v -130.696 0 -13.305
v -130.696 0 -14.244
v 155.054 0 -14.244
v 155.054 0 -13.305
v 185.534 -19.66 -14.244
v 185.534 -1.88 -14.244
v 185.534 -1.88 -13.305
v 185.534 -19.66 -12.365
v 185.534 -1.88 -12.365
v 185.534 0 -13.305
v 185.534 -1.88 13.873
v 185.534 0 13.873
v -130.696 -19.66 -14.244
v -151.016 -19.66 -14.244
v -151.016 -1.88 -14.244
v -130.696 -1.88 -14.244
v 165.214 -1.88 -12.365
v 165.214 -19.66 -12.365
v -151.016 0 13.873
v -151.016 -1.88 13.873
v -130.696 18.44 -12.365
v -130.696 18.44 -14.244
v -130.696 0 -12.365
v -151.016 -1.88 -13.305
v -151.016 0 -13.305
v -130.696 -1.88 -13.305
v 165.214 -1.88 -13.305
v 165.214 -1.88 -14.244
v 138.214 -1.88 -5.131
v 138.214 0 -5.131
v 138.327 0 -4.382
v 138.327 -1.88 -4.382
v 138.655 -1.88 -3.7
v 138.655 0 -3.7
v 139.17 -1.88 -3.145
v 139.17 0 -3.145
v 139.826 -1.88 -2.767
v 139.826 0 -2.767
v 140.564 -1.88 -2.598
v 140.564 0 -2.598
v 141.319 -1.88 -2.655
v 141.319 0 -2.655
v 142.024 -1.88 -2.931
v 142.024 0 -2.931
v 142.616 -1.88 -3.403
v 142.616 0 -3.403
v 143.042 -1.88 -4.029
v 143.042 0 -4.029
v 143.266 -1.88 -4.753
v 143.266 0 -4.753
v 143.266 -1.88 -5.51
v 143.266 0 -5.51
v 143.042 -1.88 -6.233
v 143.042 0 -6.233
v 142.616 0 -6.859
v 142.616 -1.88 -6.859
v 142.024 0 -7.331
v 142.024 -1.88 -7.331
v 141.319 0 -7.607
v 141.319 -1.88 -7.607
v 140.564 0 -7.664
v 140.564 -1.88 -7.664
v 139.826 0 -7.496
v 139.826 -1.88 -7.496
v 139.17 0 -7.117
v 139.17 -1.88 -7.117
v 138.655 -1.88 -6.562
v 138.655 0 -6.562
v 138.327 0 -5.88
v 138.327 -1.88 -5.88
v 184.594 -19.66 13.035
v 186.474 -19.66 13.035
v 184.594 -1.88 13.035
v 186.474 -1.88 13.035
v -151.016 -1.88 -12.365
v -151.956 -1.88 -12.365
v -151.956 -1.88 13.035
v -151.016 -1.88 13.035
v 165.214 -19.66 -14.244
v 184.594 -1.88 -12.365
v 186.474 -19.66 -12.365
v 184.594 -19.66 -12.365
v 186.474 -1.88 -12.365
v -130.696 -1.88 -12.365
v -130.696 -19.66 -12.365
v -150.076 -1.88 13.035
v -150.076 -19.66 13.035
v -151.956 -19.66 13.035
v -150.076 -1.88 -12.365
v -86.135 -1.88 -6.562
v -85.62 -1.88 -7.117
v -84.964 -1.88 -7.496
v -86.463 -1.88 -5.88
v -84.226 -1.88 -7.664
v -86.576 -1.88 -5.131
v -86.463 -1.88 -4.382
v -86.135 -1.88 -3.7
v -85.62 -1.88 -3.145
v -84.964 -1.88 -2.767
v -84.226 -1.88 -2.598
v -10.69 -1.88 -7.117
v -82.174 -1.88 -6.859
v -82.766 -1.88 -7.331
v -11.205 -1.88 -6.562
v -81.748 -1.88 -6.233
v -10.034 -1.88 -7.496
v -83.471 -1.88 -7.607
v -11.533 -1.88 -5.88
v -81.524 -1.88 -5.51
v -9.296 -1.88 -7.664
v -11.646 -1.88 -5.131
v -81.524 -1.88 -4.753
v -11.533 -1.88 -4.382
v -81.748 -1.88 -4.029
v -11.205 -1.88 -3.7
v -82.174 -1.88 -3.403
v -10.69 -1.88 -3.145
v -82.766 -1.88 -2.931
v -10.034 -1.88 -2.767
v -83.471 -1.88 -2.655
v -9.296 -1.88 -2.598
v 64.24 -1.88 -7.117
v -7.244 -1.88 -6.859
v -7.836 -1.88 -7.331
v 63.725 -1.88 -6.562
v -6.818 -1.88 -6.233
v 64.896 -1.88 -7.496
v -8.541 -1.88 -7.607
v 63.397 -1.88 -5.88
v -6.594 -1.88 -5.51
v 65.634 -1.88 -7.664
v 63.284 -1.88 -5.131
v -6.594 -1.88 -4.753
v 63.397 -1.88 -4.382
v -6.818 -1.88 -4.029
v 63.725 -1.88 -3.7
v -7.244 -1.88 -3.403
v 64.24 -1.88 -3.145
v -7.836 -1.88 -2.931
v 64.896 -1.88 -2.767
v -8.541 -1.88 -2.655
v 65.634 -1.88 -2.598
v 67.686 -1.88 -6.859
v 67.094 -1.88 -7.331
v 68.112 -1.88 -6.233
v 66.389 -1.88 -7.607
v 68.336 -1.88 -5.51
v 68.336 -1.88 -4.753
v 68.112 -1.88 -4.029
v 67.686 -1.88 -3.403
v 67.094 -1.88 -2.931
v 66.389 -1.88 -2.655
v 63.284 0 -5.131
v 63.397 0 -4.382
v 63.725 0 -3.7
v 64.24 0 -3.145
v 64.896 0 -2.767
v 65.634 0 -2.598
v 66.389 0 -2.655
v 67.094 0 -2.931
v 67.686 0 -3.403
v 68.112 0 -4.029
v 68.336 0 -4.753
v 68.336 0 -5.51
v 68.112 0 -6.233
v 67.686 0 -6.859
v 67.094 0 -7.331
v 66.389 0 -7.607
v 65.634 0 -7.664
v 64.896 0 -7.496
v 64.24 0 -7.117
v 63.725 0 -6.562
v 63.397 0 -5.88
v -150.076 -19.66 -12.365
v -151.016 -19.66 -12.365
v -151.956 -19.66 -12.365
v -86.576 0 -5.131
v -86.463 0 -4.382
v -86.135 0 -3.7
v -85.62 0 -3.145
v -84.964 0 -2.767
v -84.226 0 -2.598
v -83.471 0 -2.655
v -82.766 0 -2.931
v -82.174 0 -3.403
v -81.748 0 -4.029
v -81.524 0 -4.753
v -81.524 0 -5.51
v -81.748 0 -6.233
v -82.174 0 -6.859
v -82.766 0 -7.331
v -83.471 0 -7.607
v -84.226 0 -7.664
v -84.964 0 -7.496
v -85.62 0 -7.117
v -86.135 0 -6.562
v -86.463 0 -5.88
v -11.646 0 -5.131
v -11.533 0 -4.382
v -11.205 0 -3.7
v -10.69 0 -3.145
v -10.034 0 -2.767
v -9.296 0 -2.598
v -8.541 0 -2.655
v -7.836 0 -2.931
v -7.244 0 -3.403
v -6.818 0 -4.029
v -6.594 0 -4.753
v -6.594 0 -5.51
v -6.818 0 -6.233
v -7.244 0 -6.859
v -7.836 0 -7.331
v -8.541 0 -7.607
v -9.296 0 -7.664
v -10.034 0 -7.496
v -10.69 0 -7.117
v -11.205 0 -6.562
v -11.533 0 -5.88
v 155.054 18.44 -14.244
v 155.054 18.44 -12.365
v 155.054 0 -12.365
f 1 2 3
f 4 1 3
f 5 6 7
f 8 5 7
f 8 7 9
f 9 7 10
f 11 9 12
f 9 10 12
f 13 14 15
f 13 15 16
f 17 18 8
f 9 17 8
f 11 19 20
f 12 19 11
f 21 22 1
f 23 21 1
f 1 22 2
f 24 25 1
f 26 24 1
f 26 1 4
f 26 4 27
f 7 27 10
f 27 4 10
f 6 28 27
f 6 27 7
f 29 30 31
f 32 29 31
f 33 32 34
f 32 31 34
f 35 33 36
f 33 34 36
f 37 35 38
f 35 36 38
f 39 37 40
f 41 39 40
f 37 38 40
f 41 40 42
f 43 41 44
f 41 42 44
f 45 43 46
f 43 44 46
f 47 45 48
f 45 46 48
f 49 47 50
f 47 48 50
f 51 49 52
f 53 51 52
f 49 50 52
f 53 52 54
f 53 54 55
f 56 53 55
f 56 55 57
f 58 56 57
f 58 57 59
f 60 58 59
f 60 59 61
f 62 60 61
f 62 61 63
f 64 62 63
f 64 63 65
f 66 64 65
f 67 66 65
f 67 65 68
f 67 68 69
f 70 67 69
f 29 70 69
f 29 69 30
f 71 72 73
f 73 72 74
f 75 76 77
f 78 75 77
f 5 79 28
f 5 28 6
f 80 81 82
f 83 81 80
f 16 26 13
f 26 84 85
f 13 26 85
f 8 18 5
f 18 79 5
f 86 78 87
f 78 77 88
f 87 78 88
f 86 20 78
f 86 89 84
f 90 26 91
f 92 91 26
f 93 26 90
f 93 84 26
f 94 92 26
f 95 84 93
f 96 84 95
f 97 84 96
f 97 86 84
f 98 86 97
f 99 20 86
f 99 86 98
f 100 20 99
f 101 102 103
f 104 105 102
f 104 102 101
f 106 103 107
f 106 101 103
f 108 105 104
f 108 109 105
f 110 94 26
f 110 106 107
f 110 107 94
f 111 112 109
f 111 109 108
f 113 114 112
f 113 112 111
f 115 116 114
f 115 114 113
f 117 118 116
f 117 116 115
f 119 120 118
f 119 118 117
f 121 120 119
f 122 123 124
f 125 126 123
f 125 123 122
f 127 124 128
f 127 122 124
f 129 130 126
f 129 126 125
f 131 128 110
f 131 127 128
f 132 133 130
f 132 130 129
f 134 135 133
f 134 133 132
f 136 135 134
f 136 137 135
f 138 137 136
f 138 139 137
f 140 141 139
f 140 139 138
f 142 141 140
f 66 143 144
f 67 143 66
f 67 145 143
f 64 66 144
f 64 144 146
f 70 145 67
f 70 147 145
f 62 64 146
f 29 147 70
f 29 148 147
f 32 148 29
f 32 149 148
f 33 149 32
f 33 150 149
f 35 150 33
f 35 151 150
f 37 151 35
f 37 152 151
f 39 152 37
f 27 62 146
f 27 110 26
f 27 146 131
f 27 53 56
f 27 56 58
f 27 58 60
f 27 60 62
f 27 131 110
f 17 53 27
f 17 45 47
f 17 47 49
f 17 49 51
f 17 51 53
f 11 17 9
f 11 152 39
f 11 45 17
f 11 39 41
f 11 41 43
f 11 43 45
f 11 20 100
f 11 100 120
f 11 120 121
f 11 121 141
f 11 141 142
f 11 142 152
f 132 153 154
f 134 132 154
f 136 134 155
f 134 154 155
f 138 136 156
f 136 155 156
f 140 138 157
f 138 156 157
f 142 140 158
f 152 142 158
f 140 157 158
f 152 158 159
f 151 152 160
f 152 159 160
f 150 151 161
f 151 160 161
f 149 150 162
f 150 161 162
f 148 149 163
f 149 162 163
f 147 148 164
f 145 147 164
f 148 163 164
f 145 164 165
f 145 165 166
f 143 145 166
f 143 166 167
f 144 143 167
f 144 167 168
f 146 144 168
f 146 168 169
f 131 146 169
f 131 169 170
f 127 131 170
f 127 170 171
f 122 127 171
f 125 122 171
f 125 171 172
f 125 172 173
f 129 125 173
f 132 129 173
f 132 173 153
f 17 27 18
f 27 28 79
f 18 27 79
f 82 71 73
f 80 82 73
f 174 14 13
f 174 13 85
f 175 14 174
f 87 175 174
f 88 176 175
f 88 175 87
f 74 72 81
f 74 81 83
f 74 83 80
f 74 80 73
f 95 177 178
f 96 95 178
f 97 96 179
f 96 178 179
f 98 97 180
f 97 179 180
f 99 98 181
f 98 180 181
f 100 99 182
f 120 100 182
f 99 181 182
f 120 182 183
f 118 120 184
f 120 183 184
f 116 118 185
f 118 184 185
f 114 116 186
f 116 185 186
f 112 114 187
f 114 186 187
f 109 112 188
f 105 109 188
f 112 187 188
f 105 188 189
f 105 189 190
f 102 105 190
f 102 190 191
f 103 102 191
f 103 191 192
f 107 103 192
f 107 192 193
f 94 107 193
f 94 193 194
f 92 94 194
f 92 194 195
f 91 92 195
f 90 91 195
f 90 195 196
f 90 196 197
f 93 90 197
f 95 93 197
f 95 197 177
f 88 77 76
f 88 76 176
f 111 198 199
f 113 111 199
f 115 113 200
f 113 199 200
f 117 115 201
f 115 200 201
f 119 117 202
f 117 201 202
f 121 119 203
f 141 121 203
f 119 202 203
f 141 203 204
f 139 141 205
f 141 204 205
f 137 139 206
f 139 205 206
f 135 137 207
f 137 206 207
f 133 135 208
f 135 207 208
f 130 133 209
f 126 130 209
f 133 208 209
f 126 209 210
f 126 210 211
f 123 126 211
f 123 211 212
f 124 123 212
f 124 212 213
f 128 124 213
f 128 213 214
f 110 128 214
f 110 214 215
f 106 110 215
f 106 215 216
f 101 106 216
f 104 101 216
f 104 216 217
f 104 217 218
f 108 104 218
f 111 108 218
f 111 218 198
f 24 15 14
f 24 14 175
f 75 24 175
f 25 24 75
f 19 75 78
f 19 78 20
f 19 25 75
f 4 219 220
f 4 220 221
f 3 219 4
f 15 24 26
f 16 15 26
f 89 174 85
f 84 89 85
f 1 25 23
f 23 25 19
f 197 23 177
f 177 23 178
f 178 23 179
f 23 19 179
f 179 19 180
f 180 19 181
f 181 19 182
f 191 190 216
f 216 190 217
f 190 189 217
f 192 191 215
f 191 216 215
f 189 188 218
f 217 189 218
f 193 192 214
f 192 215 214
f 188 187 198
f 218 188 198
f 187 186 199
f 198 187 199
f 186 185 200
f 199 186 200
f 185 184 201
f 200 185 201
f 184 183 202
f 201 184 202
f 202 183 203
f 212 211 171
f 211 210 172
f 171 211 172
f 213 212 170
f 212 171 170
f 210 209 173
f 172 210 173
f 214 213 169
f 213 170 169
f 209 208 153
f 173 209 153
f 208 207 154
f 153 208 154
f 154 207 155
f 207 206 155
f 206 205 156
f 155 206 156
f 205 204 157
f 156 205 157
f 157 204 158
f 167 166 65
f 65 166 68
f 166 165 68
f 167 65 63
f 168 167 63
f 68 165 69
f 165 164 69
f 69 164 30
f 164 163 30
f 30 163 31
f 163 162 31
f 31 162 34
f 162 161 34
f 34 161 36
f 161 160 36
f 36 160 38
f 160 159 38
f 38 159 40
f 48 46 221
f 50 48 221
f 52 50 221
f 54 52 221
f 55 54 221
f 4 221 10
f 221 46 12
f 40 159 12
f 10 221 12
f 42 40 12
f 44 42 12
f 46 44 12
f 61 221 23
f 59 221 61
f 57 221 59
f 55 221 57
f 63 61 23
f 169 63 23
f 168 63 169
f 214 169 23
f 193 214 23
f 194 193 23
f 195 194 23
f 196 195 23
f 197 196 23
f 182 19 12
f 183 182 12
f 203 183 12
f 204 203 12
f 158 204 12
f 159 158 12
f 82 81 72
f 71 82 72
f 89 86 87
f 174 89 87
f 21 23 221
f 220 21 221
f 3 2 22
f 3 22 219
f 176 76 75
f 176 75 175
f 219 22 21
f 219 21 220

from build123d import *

# Parameters (mm, degrees)
F0_W      = 336.55
F0_H      = 27.178
F1_DEPTH  = 1.8796
F2_W      = 20.32
F2_H      = 17.78
F3_DEPTH  = 0.9398
F4_W      = 17.78
F4_H      = 25.4
F5_DEPTH  = 0.9398
F6_W      = 17.78
F6_H      = 25.4
F7_DEPTH  = 0.9398
F8_W      = 285.75
F8_H      = 18.4404
F9_DEPTH  = 0.9398
F11_D     = 5.08
F11_DEPTH = 25.4
F11_TIP   = 1.5261859723


with BuildPart() as f1:
    # F0 (on Front) → F1 (new body)
    with BuildSketch(Plane.XZ):
        with Locations((17.259075248, 0.2843956463)):
            Rectangle(F0_W, F0_H)
    extrude(amount=F1_DEPTH)

    # F2 (on face) → F3 (join, symmetric)
    with BuildSketch(Plane(origin=(0, 0, -13.3046043537), x_dir=(1, 0, 0), z_dir=(0, 0, -1))):
        with Locations((-140.855924752, 10.7696)):
            Rectangle(F2_W, F2_H)
        with Locations((175.374075248, 10.7696)):
            Rectangle(F2_W, F2_H)
    extrude(amount=F3_DEPTH, both=True)

    # F4 (on face) → F5 (join, symmetric)
    with BuildSketch(Plane(origin=(-151.015924752, 0, 0), x_dir=(0, -1, 0), z_dir=(-1, 0, 0))):
        with Locations((10.7696, 0.3351956463)):
            Rectangle(F4_W, F4_H)
    extrude(amount=F5_DEPTH, both=True)

    # F8 (on face) → F9 (join, symmetric)
    with BuildSketch(Plane(origin=(0, 0, -13.3046043537), x_dir=(1, 0, 0), z_dir=(0, 0, -1))):
        with Locations((12.179075248, -9.2202)):
            Rectangle(F8_W, F8_H)
    extrude(amount=F9_DEPTH, both=True)

    # F11
    with Locations(Plane.XZ.offset(1.8796)):
        with Locations((-84.036124752, -5.1310979761), (-9.106124752, -5.1310979761), (65.823875248, -5.1310979761), (140.753875248, -5.1310979761)):
            Hole(F11_D / 2, depth=F11_DEPTH)
            with Locations((0, 0, -(F11_DEPTH + F11_TIP / 2))):  # 118° drill point
                Cone(0, F11_D / 2, F11_TIP, mode=Mode.SUBTRACT)


with BuildPart() as f7:
    # F6 (on face) → F7 (new body, symmetric)
    with BuildSketch(Plane.YZ.offset(185.534075248)):
        with Locations((-10.7696, 0.3351956463)):
            Rectangle(F6_W, F6_H)
    extrude(amount=F7_DEPTH, both=True)


solid = Compound([f1.part, f7.part])
